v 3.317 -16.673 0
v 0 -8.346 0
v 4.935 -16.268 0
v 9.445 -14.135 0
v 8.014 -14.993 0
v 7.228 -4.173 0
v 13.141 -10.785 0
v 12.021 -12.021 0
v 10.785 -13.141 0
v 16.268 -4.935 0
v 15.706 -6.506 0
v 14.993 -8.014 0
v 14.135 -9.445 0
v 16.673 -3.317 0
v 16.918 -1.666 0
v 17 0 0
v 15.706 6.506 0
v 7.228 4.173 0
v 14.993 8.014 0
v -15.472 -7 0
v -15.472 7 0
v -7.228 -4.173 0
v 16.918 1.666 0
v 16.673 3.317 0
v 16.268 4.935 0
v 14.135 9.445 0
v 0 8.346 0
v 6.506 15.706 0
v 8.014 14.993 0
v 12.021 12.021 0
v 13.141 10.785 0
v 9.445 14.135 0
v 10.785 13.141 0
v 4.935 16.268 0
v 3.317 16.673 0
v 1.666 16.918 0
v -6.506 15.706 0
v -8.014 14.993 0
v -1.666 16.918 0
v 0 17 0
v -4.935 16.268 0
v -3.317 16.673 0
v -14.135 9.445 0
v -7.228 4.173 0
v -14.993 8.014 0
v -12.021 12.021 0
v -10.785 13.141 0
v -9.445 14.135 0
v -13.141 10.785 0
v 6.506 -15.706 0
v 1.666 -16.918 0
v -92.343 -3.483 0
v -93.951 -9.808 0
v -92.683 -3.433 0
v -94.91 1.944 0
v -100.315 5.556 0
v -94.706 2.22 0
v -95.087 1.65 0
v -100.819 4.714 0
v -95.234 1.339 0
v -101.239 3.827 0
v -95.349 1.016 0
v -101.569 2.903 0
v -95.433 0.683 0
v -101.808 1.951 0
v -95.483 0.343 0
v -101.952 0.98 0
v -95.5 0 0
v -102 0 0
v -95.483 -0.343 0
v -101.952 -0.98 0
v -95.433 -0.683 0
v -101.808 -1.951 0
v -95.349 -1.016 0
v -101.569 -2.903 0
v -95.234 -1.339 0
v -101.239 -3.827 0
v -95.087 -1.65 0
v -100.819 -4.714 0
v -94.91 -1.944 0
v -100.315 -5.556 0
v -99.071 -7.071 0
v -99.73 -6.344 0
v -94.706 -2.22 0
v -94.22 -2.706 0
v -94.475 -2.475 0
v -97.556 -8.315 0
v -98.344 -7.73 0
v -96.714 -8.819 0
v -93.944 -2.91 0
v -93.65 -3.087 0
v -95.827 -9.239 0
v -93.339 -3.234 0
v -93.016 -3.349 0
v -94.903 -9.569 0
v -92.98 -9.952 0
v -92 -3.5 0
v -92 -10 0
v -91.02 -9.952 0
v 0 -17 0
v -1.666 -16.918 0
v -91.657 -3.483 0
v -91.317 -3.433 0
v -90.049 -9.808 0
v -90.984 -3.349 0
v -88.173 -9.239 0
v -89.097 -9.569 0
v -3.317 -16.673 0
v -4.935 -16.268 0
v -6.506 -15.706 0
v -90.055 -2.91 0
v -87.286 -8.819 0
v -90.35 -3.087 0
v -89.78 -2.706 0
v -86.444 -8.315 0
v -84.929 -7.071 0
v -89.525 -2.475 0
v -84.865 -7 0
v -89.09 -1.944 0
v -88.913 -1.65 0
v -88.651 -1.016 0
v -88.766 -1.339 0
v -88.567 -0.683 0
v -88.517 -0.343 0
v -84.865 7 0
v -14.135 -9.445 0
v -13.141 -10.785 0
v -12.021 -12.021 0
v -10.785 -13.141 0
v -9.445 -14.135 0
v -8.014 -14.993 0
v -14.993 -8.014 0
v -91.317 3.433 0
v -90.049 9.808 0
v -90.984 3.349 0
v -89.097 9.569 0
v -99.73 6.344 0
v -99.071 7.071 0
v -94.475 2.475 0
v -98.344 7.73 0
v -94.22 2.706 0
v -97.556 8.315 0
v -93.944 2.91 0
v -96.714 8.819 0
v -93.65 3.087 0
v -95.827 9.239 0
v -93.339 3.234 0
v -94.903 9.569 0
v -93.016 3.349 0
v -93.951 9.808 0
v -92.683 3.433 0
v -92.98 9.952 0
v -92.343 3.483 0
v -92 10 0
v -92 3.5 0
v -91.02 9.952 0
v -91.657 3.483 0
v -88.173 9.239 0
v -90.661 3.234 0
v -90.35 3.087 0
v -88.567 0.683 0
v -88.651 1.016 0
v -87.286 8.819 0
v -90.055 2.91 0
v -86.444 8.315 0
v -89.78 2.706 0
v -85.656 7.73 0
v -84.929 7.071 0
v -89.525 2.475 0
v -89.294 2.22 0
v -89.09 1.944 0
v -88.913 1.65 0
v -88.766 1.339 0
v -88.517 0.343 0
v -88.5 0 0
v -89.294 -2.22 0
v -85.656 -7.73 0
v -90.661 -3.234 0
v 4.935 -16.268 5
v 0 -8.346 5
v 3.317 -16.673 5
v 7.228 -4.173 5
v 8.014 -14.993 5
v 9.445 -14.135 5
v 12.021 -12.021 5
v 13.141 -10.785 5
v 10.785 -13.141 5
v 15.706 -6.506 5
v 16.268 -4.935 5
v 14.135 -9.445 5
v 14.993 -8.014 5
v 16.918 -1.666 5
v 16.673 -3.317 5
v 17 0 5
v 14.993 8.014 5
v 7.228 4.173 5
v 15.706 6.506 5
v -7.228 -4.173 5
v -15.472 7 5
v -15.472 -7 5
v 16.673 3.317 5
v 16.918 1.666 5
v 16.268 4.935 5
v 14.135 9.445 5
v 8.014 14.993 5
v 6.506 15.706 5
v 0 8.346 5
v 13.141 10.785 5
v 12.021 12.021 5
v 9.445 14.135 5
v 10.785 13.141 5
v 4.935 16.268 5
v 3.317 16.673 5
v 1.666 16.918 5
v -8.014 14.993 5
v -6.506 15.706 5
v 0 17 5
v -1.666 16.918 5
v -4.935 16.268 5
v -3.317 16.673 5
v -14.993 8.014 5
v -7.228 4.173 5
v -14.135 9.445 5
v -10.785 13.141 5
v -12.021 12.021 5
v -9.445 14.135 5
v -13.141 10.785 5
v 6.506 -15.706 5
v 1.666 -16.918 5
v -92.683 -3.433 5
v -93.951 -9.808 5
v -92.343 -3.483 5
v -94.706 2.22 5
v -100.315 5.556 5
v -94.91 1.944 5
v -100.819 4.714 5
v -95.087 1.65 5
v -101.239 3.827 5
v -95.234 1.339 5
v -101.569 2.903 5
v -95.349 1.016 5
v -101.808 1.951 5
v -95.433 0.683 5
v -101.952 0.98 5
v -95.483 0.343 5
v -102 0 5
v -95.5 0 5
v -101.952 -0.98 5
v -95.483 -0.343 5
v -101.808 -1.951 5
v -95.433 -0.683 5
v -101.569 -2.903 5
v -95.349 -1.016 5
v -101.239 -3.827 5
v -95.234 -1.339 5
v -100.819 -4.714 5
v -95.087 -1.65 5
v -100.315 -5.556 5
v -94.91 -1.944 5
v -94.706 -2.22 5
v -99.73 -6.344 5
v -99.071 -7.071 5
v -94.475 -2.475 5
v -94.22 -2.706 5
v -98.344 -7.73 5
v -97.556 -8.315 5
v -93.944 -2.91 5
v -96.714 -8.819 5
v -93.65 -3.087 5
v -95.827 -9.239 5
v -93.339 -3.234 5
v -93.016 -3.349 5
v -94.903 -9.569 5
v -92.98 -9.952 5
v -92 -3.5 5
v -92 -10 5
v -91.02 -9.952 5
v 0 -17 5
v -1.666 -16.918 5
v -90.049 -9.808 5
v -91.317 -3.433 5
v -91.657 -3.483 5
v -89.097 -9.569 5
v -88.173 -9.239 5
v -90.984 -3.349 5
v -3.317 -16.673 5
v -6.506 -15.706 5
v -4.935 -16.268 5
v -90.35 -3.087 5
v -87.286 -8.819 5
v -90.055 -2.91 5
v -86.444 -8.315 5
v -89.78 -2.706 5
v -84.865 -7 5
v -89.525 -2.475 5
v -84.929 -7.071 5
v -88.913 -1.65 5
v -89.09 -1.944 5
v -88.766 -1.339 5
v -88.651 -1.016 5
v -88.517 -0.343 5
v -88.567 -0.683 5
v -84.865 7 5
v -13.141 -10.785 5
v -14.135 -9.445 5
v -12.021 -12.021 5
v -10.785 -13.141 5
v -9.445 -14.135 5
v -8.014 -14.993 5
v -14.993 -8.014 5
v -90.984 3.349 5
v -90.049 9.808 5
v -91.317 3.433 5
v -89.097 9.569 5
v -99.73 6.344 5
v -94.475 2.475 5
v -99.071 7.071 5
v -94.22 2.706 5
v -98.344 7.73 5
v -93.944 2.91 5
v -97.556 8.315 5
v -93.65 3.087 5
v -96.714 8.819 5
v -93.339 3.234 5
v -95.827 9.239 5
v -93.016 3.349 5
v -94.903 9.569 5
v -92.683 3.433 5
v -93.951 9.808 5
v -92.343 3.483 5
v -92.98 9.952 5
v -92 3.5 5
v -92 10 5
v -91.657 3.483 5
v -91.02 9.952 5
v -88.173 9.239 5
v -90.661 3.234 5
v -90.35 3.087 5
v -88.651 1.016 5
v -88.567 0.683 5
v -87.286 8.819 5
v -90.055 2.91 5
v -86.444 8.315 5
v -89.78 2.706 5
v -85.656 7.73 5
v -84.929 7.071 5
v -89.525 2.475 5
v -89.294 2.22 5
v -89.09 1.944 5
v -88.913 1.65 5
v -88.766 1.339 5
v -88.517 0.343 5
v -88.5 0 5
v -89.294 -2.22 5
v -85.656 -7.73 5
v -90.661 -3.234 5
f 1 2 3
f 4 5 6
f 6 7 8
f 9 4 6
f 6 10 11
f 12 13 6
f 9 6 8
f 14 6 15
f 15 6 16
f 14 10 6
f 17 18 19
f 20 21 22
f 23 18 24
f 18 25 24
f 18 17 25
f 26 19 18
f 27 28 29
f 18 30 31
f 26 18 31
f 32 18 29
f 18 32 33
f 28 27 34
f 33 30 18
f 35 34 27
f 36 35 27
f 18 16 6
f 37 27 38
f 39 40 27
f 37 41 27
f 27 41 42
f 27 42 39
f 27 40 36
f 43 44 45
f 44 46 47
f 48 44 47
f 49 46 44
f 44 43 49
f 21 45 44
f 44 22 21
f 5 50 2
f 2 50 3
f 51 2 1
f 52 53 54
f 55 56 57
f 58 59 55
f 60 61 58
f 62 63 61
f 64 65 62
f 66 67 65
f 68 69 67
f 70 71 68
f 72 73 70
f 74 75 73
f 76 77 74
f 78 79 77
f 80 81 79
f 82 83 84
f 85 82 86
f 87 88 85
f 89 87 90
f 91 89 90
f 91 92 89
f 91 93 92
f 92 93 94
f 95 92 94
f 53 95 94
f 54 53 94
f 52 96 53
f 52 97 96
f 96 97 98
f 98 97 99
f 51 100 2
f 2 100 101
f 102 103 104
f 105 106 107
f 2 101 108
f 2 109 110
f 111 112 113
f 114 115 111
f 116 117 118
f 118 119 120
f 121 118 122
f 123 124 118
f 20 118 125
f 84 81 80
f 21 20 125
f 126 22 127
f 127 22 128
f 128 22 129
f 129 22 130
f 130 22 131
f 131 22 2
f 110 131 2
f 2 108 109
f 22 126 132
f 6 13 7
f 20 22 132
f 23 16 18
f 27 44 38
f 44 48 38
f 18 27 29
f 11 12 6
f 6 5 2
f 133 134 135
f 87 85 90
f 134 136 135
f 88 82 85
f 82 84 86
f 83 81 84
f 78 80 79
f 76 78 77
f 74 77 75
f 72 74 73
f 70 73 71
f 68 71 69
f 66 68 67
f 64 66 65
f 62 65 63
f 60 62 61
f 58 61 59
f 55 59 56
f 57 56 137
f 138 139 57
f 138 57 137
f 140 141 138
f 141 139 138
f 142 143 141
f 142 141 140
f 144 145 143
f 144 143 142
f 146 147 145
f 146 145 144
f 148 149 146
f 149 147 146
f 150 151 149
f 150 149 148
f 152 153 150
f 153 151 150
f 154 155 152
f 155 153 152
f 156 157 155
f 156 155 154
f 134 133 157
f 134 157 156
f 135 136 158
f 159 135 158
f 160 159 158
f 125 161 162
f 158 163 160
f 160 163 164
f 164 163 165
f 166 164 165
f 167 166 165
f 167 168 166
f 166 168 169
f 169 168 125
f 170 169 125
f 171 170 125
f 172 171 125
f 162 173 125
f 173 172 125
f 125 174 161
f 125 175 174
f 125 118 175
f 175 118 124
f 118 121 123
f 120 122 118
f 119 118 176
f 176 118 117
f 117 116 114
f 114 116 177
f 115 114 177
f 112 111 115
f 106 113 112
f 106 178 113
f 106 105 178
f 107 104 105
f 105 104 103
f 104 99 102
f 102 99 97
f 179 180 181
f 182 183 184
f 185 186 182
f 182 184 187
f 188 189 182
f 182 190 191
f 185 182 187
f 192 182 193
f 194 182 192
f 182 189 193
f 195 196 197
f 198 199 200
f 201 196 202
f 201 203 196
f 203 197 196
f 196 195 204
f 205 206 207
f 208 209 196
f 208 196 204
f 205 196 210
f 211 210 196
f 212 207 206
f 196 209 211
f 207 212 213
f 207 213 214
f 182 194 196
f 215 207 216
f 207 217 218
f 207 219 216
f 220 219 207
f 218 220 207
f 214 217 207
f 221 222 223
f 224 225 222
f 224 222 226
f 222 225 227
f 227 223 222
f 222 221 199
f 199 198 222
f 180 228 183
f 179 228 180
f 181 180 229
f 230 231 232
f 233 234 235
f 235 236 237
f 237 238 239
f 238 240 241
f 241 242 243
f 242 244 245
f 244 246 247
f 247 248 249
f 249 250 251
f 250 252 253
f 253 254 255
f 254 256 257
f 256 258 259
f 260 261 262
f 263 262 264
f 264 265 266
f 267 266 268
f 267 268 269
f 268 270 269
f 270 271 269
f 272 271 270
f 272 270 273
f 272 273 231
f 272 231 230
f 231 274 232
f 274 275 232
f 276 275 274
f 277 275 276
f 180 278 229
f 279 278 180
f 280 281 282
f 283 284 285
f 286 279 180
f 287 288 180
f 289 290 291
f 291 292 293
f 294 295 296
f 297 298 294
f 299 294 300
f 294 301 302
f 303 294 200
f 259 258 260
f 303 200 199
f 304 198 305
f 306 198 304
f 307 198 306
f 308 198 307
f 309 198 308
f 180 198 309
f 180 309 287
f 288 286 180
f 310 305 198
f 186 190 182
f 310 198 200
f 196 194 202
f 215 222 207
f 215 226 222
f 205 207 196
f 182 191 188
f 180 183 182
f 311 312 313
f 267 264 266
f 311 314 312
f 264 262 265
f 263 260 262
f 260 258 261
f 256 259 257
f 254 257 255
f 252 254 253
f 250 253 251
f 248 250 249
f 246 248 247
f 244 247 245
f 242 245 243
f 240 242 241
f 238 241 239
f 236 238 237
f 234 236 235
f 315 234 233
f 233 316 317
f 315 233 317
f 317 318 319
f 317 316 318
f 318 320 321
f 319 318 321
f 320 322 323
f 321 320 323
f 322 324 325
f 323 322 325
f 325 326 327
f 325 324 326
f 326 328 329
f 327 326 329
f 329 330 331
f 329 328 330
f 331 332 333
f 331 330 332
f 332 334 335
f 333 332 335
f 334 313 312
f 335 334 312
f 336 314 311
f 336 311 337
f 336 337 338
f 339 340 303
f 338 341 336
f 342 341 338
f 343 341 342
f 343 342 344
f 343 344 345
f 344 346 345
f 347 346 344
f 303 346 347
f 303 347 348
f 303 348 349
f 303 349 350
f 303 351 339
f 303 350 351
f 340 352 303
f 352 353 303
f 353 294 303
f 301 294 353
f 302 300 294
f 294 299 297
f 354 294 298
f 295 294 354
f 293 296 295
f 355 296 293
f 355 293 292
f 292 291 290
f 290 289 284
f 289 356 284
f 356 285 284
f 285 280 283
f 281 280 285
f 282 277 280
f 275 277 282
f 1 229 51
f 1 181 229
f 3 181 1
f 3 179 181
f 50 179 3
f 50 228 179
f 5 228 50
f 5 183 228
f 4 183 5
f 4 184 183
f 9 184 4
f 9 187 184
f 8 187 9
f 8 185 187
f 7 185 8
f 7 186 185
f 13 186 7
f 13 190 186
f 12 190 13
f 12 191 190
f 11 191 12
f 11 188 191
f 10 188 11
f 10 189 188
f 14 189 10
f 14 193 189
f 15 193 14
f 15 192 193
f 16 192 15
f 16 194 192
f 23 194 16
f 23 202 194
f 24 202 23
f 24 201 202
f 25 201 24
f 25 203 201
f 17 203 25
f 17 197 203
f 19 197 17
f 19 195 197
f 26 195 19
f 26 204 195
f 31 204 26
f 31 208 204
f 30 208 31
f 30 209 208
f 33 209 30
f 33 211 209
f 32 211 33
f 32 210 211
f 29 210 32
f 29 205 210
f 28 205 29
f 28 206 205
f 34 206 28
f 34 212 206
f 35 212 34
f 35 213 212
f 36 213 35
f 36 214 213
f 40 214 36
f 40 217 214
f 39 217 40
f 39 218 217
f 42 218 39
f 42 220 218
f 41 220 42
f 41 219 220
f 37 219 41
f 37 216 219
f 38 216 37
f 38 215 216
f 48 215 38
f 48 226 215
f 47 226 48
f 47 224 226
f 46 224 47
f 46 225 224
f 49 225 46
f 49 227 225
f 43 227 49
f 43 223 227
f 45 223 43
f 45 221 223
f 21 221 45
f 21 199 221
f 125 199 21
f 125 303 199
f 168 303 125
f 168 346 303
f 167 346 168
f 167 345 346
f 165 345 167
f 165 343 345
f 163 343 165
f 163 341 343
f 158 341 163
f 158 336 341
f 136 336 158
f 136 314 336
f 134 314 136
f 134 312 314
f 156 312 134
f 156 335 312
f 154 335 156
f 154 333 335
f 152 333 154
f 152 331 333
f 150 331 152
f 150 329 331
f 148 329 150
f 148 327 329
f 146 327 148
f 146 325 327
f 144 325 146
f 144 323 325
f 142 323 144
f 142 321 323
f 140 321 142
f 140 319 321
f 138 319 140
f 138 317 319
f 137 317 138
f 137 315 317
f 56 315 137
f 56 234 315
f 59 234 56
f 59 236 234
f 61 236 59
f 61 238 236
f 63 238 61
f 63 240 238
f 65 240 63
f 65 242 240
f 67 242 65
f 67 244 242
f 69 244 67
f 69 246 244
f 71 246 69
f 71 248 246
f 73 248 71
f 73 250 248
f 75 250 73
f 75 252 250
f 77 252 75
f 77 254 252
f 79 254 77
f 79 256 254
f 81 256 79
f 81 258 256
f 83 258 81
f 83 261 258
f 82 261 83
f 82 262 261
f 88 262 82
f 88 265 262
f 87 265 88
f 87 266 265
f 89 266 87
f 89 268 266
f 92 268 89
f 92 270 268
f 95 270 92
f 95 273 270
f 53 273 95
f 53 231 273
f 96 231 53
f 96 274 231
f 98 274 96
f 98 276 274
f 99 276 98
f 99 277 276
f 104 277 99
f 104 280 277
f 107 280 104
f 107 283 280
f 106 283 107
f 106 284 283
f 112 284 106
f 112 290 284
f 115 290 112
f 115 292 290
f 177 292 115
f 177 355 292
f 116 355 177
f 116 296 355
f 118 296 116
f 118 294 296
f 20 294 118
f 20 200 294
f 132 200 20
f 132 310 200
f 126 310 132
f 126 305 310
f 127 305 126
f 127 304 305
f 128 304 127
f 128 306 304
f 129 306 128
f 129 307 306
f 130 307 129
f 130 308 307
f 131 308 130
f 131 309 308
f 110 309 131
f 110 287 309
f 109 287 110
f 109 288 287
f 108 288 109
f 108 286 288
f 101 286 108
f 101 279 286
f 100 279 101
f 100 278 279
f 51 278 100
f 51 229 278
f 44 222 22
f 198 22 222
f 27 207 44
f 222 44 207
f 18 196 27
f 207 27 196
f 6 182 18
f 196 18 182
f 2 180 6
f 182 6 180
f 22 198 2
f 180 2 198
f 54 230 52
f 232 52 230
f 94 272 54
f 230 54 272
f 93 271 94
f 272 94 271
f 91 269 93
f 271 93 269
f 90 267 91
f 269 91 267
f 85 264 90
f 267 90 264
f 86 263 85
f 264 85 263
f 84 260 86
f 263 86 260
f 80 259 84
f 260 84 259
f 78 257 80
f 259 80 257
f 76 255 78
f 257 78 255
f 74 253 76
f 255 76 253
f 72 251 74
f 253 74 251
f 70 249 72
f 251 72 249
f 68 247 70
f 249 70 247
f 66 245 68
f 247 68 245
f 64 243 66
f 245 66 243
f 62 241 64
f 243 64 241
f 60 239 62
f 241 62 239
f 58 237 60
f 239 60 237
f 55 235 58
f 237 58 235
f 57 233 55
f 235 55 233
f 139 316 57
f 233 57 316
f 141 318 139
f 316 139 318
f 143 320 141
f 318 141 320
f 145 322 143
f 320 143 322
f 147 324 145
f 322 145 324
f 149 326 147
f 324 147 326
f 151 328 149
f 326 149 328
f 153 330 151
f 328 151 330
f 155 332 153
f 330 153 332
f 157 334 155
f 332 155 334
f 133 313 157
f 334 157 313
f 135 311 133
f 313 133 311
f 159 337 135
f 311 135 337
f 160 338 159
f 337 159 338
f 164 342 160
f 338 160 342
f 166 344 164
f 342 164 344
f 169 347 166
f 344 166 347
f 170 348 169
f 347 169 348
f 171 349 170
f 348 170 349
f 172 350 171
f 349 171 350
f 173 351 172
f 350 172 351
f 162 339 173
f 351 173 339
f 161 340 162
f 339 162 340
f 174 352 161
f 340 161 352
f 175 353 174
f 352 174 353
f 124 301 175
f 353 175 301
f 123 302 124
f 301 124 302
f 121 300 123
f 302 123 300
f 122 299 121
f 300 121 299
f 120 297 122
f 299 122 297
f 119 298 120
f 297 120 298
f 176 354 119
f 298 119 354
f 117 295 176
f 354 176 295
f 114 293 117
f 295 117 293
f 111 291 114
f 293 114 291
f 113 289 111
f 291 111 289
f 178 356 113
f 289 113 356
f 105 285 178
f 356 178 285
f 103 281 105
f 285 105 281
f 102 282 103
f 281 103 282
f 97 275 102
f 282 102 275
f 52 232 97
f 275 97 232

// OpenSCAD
// Simple printable box-end wrench for the iPhone holder bolt.
//
// The bolt head in 2026-07-03_iphone_15_pro_max_hollow_box.scad is:
//   cylinder(d = 16, h = 5, $fn = 6)
//
// A 16 mm hex by circumscribed diameter has about 13.86 mm across flats.
// This wrench adds clearance so the printed ring head can slide over the head.

$fn = 64;

bolt_head_corner_d = 16;
bolt_head_across_flats = bolt_head_corner_d * cos(30);

wrench_clearance = 0.6;
wrench_opening_across_flats = bolt_head_across_flats + wrench_clearance;
wrench_opening_corner_d = wrench_opening_across_flats / cos(30);

wrench_thickness = 5;
wrench_head_outer_d = 34;
wrench_handle_length = 92;
wrench_handle_width = 14;
wrench_handle_end_d = 20;
wrench_hanger_hole_d = 7;

module wrench_outline_2d() {
    union() {
        circle(d = wrench_head_outer_d);

        hull() {
            translate([-wrench_handle_length, 0])
                circle(d = wrench_handle_width);

            translate([-8, 0])
                circle(d = wrench_handle_width);
        }

        translate([-wrench_handle_length, 0])
            circle(d = wrench_handle_end_d);
    }
}

module wrench_cutouts_2d() {
    union() {
        rotate(30)
            circle(d = wrench_opening_corner_d, $fn = 6);

        translate([-wrench_handle_length, 0])
            circle(d = wrench_hanger_hole_d);
    }
}

linear_extrude(height = wrench_thickness)
    difference() {
        wrench_outline_2d();
        wrench_cutouts_2d();
    }
